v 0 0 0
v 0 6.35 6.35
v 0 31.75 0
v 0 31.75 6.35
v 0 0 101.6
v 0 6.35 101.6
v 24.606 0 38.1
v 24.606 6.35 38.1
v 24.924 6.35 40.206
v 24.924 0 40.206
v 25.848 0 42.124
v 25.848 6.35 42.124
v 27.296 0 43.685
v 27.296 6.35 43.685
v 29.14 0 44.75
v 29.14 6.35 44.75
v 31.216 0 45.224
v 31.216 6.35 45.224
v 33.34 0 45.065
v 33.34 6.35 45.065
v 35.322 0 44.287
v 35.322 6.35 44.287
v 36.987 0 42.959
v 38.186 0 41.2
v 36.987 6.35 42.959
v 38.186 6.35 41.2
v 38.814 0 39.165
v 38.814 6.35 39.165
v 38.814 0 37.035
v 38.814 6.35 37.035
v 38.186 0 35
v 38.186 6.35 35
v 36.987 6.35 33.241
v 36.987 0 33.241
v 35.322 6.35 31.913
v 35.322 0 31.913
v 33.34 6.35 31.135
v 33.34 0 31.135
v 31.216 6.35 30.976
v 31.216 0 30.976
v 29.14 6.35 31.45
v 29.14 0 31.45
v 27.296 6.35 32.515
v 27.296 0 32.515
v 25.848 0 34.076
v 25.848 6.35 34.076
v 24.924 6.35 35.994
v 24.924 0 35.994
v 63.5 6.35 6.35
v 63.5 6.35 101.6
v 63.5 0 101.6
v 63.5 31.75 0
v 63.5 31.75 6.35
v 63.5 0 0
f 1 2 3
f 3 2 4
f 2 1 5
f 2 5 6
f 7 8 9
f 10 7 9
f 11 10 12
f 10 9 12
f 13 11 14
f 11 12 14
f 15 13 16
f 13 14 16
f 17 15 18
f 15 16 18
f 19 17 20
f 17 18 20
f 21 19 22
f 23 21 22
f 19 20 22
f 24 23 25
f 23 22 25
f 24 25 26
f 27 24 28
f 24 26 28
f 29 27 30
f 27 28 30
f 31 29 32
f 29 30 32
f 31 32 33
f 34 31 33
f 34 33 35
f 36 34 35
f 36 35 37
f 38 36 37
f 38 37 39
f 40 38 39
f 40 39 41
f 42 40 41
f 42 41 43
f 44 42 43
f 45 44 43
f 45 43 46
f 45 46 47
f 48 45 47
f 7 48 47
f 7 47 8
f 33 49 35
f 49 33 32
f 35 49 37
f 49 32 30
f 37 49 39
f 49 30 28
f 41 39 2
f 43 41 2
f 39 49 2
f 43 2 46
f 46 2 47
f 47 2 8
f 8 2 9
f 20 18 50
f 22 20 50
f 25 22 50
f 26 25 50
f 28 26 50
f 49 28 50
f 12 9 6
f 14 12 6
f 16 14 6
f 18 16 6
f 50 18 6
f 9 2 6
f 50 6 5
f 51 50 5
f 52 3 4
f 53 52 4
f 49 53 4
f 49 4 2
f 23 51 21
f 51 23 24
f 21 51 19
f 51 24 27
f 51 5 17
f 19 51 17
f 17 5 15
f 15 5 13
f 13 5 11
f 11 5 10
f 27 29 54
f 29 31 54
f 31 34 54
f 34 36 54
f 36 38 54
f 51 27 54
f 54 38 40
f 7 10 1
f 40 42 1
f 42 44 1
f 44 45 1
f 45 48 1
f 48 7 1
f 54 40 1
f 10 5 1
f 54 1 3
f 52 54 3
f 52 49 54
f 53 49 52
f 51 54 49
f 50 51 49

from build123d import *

# Parameters (mm, degrees)
F1_DEPTH = 63.5
F3_D     = 14.2875


with BuildPart() as f1:
    # F0 (on Right) → F1 (new body)
    with BuildSketch(Plane.YZ):
        Polygon((0, 101.6), (0, 0), (31.75, 0), (31.75, 6.35), (6.35, 6.35), (6.35, 101.6), align=None)
    extrude(amount=F1_DEPTH)

    # F3 (through all)
    with Locations(Plane.XZ):
        with Locations((31.75, 38.1)):
            Hole(F3_D / 2)


solid = f1.part
